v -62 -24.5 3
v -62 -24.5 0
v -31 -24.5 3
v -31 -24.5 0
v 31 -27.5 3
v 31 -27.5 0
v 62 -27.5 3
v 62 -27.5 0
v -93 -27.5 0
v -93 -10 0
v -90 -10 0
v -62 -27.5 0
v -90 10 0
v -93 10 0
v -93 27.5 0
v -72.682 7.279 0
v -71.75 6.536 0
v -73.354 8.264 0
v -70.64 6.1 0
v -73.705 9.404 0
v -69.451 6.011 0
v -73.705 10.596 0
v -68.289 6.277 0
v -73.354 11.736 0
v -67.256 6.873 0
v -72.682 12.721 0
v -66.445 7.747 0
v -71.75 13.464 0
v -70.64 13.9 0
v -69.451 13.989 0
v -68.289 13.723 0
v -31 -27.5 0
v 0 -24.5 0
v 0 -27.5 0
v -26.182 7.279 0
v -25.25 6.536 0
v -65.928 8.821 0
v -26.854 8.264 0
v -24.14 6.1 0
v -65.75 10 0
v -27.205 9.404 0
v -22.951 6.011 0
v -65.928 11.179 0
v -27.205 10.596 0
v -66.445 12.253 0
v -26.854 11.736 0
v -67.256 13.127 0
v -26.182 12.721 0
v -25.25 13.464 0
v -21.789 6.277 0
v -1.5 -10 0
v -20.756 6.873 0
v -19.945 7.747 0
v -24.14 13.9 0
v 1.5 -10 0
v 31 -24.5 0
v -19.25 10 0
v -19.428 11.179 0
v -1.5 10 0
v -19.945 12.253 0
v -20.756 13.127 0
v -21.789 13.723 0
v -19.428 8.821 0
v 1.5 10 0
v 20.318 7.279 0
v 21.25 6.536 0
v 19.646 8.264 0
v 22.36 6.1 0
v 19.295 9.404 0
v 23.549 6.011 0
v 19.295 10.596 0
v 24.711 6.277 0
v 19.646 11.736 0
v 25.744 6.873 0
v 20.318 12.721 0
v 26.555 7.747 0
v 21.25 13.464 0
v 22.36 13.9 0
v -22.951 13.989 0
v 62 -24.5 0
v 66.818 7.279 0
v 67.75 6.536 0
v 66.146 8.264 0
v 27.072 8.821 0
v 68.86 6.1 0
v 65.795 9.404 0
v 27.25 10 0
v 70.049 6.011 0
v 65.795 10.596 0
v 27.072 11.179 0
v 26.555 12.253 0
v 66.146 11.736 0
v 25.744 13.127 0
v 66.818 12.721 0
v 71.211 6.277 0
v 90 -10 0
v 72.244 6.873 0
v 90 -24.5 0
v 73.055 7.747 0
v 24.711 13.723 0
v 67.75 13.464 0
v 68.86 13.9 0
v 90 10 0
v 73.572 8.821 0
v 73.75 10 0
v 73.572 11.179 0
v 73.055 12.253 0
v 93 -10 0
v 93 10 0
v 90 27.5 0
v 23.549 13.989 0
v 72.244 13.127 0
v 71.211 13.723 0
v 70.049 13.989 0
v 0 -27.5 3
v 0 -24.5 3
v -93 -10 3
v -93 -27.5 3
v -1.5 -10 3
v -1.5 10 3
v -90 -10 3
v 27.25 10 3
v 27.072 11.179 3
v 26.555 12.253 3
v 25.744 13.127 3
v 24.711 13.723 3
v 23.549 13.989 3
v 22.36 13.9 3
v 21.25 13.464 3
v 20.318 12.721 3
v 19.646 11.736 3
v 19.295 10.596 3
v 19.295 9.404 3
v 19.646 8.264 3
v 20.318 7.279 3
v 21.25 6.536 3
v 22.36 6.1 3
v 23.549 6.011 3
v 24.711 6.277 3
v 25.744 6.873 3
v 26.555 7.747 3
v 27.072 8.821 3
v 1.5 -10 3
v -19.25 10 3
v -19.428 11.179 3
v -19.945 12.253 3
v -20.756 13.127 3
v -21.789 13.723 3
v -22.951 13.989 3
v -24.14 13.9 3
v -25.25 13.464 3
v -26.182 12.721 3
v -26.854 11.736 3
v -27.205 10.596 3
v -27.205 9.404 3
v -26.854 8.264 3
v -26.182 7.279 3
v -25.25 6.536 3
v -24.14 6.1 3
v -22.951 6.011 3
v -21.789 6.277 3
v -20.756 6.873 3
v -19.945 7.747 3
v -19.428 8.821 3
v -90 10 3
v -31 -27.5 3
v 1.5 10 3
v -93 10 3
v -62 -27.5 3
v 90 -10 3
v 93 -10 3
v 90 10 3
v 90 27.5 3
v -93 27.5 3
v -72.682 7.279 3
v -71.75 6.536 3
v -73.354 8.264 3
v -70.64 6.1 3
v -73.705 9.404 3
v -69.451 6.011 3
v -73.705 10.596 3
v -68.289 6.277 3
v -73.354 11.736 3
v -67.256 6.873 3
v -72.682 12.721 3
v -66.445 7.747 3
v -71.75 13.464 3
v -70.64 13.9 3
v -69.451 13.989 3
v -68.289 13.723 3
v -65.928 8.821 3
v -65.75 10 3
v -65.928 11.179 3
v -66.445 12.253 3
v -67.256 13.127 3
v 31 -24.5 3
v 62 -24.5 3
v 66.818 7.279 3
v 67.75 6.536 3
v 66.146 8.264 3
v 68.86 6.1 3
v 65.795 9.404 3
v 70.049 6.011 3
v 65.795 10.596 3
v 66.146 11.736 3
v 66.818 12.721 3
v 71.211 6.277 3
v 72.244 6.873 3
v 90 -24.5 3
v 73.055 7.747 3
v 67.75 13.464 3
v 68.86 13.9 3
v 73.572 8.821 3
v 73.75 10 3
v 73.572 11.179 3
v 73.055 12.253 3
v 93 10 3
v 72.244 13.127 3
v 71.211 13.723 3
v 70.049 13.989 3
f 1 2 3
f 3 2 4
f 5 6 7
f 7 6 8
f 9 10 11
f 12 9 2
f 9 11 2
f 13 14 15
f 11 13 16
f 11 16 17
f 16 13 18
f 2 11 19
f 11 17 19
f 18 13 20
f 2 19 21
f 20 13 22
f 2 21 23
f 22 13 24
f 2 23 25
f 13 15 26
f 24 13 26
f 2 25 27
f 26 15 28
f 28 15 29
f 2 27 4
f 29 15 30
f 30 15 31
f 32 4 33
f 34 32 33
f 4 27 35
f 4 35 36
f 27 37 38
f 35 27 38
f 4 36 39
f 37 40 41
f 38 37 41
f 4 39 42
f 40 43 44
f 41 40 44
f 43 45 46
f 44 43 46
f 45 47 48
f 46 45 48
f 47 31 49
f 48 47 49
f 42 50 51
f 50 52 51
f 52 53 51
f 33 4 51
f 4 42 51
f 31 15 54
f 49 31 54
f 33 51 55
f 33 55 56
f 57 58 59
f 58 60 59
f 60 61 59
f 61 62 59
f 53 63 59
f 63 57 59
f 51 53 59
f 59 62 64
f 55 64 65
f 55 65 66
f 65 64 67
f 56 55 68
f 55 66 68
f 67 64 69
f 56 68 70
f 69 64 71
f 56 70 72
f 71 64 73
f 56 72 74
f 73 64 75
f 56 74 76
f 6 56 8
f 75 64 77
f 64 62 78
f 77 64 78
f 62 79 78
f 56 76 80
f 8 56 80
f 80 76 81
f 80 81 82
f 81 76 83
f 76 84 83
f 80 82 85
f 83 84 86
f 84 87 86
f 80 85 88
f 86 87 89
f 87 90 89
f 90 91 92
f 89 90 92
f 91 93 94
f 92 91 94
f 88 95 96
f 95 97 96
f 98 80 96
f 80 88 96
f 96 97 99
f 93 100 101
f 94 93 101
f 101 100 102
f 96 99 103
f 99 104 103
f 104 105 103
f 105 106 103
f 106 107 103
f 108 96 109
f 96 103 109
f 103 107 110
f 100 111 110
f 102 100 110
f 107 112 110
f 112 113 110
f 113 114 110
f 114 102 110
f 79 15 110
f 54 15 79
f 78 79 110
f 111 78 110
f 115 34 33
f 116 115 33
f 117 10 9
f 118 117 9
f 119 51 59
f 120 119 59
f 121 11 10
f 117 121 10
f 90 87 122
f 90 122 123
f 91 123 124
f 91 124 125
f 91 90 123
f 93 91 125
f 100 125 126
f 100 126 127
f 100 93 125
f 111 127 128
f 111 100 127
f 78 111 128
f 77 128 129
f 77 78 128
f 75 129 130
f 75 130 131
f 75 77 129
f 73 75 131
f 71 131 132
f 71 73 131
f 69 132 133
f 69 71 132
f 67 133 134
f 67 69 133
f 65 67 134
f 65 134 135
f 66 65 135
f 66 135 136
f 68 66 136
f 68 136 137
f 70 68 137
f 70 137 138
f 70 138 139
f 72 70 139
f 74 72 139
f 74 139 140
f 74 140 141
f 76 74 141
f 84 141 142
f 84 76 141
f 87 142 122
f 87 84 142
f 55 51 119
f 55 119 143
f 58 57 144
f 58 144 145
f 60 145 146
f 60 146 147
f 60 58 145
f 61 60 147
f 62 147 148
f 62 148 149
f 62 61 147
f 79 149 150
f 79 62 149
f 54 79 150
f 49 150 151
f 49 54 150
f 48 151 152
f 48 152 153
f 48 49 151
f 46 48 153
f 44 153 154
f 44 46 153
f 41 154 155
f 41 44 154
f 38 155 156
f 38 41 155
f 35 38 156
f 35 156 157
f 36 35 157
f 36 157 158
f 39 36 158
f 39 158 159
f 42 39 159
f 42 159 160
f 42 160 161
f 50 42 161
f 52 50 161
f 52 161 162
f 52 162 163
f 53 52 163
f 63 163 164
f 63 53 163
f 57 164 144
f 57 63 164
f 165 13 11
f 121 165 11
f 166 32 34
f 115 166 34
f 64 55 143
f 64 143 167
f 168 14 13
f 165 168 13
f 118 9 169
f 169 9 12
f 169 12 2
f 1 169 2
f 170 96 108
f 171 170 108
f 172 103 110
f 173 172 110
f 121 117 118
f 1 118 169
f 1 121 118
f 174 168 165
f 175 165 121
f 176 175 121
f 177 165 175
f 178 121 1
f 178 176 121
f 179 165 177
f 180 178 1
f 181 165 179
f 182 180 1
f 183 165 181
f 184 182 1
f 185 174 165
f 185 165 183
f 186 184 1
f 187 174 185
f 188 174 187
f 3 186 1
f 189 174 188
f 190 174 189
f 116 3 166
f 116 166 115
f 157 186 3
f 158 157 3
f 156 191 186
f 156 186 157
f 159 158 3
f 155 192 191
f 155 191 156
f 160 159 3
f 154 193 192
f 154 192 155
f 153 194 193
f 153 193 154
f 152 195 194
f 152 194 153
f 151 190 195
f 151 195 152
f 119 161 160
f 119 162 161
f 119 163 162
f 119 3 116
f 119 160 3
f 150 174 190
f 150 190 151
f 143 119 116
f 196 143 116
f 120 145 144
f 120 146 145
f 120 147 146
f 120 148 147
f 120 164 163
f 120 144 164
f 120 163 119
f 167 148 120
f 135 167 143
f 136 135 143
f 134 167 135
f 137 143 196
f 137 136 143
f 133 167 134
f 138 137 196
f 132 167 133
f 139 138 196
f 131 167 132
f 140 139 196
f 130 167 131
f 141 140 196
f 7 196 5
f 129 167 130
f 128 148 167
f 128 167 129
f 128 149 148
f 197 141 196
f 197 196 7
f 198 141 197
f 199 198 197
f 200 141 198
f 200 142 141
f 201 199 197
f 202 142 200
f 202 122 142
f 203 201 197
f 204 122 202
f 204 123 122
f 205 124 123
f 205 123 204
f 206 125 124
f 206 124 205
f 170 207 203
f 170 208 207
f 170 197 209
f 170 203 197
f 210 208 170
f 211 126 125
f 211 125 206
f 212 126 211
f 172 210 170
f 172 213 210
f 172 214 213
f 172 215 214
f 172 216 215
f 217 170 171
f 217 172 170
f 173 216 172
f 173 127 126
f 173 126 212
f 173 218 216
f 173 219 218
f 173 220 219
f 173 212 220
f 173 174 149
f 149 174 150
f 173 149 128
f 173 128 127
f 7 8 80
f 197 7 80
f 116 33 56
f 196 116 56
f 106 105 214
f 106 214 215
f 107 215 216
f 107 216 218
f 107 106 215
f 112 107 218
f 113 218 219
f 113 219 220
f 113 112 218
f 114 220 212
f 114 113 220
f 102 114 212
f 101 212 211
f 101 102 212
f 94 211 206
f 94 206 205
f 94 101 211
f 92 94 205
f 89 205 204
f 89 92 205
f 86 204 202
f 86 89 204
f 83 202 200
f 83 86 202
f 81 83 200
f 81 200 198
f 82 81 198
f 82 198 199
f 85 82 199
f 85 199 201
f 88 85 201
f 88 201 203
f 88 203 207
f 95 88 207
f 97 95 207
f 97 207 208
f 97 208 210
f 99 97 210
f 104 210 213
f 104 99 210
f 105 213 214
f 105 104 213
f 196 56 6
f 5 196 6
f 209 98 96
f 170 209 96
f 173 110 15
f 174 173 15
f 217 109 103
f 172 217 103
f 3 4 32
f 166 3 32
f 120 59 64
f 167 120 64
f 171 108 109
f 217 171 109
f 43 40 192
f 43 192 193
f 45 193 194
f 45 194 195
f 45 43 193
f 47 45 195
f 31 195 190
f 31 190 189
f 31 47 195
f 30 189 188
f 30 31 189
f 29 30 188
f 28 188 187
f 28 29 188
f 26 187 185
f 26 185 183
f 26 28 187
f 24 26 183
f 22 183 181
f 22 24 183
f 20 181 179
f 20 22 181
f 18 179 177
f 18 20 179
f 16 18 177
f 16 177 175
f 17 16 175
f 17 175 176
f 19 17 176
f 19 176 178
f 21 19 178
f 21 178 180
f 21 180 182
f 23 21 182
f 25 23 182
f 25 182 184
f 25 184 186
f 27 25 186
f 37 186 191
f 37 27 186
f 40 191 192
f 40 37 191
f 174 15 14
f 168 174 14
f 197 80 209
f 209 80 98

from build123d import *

# Parameters (mm, degrees)
SKETCH1_R           = 4
SKETCH1_W           = 3
SKETCH1_H           = 20
BOSS_EXTRUDE1_DEPTH = 3


with BuildPart() as part:
    # Sketch1 → Boss-Extrude1 (new body)
    with BuildSketch(Plane.XY):
        Polygon((-93, 27.5), (-93, 10), (-90, 10), (-90, -10), (-93, -10), (-93, -27.5), (-62, -27.5), (-62, -24.5), (-31, -24.5), (-31, -27.5), (0, -27.5), (0, -24.5), (31, -24.5), (31, -27.5), (62, -27.5), (62, -24.5), (90, -24.5), (90, -10), (93, -10), (93, 10), (90, 10), (90, 27.5), (0, 27.5), align=None)
        with Locations((-69.75, 10)):
            Circle(SKETCH1_R, mode=Mode.SUBTRACT)
        Rectangle(SKETCH1_W, SKETCH1_H, mode=Mode.SUBTRACT)
        with Locations((-23.25, 10)):
            Circle(SKETCH1_R, mode=Mode.SUBTRACT)
        with Locations((23.25, 10)):
            Circle(SKETCH1_R, mode=Mode.SUBTRACT)
        with Locations((69.75, 10)):
            Circle(SKETCH1_R, mode=Mode.SUBTRACT)
    extrude(amount=BOSS_EXTRUDE1_DEPTH)


solid = part.part
